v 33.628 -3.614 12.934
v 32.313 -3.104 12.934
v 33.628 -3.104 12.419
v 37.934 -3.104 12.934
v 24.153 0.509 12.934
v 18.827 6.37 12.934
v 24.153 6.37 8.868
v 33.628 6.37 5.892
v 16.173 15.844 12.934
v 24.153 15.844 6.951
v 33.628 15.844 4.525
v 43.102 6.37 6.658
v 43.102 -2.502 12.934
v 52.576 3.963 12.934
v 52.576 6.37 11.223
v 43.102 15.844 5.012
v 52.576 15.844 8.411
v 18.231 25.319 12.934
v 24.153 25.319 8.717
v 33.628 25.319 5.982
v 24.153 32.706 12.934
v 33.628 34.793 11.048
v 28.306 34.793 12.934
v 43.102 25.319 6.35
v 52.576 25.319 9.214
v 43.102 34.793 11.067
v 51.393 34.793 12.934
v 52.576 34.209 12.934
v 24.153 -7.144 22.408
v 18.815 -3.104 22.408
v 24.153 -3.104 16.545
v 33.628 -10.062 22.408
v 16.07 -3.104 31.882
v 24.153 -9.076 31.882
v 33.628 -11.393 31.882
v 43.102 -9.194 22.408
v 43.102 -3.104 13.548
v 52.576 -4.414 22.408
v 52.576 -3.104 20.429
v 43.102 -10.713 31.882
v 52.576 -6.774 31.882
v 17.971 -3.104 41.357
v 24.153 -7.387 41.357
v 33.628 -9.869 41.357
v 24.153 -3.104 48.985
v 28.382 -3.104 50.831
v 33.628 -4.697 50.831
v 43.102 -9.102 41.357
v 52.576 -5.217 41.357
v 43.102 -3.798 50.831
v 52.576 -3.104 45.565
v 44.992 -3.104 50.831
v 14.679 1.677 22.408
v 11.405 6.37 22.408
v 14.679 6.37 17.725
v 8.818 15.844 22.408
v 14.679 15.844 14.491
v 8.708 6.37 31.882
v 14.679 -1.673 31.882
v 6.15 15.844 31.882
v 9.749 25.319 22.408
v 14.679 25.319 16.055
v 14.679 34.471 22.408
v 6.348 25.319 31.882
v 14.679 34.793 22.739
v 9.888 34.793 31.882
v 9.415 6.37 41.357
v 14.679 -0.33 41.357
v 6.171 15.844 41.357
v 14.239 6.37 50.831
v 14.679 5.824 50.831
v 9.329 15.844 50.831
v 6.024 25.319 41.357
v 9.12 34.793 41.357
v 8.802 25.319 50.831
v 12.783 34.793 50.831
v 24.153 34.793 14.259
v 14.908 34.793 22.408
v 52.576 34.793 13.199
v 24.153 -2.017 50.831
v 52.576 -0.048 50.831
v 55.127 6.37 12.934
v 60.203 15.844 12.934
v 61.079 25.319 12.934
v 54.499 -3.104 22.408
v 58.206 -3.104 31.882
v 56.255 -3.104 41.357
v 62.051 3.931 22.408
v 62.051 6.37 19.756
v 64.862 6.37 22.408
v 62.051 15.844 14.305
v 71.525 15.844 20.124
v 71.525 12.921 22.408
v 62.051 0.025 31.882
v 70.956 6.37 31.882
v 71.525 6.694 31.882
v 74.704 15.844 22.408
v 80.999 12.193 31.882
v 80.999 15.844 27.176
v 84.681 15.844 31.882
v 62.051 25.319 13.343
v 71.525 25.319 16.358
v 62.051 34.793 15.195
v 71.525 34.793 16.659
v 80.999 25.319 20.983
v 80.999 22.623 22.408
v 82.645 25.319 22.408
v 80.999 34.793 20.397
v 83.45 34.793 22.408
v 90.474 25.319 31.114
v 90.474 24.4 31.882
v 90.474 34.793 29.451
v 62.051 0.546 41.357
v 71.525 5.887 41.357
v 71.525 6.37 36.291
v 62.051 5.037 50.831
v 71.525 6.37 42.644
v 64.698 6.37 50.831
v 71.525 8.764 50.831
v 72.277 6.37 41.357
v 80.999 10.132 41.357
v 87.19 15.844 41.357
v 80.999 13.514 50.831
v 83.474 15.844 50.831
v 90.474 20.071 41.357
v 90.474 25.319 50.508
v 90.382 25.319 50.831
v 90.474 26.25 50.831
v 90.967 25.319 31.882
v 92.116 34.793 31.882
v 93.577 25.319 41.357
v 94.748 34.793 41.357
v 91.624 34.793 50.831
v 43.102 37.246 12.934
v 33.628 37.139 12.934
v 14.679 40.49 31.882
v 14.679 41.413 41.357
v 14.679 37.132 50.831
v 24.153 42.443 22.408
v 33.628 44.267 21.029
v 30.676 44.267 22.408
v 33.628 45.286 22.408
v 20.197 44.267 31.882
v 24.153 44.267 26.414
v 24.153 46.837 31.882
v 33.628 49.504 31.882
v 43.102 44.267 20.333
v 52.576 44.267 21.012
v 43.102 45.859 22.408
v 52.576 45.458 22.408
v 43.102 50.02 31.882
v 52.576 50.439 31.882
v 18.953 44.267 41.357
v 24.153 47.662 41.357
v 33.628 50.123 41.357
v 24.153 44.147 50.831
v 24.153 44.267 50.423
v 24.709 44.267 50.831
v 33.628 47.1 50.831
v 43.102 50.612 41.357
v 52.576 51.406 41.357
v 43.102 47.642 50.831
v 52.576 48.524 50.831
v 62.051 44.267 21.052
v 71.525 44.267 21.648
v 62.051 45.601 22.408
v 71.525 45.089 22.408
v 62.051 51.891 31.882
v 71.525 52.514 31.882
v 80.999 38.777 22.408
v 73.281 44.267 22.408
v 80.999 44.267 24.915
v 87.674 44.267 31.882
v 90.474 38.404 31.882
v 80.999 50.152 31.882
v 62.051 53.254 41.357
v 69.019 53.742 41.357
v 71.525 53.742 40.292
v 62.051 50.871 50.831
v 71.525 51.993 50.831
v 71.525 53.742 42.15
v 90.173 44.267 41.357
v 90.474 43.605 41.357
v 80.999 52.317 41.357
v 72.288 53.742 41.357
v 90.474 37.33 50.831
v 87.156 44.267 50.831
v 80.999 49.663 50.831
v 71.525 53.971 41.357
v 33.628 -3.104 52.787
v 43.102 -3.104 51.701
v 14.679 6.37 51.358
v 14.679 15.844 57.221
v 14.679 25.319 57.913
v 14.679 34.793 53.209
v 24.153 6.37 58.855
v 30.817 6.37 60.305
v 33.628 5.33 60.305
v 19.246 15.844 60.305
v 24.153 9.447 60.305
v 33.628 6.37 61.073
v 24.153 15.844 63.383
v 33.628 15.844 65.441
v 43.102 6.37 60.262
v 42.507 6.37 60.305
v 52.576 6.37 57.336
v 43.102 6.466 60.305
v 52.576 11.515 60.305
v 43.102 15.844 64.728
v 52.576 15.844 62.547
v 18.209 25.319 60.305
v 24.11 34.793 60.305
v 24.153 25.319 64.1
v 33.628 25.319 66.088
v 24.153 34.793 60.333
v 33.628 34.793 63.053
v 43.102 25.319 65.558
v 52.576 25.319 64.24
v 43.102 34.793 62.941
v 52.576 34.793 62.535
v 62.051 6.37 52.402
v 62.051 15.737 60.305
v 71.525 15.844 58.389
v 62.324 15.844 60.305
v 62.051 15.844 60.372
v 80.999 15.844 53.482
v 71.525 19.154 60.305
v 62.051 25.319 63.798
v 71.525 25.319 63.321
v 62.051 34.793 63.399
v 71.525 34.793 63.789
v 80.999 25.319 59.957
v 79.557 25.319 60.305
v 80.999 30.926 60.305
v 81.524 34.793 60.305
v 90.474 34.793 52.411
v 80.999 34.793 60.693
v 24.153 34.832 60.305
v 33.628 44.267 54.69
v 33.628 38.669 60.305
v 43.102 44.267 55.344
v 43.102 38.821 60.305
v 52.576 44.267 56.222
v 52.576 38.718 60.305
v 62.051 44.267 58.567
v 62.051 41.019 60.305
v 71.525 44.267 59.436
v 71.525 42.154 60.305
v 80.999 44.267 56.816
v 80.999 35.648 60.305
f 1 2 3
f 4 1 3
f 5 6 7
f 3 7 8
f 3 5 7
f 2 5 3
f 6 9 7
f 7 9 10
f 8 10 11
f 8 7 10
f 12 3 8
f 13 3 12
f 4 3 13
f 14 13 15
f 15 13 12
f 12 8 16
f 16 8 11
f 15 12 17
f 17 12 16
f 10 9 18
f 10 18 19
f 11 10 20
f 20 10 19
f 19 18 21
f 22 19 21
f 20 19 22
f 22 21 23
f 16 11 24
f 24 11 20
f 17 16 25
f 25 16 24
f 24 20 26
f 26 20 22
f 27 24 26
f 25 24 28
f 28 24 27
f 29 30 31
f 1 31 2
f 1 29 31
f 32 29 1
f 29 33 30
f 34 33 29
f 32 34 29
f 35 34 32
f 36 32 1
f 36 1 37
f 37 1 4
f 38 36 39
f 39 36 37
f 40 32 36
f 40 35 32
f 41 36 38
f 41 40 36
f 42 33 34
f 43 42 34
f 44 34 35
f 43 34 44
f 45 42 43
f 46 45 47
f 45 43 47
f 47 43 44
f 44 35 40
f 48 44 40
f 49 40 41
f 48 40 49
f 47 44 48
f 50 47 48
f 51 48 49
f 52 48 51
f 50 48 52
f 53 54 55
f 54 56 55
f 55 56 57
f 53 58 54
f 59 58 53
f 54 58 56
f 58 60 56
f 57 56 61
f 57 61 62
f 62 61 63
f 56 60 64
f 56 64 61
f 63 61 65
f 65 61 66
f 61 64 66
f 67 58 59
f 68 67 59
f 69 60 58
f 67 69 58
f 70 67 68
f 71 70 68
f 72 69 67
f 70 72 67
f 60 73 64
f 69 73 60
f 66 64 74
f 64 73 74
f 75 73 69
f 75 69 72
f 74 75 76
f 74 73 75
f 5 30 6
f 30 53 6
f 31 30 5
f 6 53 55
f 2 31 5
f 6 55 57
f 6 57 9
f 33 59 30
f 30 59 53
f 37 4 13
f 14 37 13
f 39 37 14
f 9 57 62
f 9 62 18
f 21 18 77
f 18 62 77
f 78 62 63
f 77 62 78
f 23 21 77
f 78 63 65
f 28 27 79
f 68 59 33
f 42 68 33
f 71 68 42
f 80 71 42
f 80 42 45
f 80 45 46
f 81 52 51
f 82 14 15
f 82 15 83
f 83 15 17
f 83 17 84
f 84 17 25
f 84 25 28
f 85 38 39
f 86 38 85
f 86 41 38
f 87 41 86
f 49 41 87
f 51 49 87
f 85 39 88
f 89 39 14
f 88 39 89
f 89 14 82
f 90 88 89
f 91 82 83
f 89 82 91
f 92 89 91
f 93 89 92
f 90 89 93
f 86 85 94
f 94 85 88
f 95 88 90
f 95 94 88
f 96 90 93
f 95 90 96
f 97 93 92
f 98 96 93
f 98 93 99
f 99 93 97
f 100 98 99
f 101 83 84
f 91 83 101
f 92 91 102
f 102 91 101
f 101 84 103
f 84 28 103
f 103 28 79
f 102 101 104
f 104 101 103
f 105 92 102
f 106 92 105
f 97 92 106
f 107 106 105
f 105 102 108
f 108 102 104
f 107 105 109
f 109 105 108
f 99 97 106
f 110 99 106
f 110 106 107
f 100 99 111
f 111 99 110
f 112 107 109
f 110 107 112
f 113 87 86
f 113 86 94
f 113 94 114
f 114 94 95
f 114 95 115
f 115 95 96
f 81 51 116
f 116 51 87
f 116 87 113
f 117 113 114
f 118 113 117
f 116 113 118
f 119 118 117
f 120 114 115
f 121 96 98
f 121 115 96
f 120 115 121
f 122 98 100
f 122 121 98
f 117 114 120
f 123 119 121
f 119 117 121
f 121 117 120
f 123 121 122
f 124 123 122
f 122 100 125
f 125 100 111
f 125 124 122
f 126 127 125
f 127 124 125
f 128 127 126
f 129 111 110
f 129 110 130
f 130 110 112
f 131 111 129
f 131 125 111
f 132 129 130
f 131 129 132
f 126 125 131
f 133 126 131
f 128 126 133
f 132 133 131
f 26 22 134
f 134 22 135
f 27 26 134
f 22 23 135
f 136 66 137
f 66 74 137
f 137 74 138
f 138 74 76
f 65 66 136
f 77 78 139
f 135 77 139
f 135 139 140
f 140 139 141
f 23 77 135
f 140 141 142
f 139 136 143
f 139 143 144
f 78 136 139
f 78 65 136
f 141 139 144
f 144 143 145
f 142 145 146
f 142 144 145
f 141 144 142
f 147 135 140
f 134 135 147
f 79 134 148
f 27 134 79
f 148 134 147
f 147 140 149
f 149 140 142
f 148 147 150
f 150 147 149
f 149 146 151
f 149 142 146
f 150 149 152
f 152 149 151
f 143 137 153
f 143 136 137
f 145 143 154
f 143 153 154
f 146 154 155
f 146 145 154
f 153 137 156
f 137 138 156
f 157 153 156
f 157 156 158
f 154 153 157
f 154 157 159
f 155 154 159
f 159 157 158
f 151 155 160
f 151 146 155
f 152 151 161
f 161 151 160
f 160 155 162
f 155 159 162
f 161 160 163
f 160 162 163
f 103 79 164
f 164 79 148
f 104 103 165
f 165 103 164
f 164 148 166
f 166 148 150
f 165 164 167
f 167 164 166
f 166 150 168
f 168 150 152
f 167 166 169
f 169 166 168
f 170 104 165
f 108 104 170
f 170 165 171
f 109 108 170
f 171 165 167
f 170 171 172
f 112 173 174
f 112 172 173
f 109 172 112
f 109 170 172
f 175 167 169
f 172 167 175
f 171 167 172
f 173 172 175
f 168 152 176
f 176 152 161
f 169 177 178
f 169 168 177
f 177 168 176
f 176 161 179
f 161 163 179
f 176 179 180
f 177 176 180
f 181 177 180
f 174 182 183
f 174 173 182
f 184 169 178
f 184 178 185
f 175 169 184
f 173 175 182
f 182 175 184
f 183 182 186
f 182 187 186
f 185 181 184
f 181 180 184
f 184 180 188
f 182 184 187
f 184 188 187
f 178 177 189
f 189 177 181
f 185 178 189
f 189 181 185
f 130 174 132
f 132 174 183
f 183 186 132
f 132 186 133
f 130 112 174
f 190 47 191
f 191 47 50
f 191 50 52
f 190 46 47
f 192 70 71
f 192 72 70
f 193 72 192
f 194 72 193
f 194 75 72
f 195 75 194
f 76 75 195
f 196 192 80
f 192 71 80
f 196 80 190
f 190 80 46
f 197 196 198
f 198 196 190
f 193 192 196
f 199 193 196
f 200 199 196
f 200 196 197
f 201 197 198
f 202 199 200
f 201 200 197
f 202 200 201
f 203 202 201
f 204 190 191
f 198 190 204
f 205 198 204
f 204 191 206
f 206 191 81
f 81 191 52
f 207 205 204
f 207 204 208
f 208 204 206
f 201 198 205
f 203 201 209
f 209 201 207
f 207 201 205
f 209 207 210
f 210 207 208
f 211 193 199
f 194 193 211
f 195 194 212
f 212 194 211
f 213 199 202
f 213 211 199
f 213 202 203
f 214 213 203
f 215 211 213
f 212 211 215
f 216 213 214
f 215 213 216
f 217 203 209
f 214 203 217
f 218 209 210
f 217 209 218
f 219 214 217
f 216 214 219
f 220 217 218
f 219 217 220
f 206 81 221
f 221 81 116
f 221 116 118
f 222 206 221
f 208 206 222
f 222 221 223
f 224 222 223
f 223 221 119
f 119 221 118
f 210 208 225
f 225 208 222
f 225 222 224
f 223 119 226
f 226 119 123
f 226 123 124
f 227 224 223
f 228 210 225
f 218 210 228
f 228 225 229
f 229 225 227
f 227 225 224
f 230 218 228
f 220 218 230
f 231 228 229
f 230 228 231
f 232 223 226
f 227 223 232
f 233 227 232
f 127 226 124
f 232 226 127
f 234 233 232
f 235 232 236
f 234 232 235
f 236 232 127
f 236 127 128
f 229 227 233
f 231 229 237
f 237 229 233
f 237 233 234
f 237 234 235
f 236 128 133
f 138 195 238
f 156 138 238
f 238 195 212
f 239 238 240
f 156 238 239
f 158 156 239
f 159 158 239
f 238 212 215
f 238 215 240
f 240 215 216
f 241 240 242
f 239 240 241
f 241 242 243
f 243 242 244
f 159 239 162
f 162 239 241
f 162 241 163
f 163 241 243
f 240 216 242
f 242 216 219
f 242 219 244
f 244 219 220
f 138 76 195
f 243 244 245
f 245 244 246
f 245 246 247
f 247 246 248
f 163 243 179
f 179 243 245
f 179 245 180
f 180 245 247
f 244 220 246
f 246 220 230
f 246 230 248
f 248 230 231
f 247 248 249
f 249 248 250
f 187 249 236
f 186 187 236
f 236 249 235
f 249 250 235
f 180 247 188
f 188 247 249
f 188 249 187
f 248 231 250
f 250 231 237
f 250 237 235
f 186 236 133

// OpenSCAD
/*
SomeBalls.scad
Public Domain Code
Based on Metaballs By: William A Adams 	4 June 2011

This code is a simplified implementation of the 'metaball' and uses "Marching Cubes" to register the isosurface which is the interaction of the various balls. All Cubes are tested and a joint hull is generated of each corner that lies inside the threshold  of the metaball 



*/
Resolution = 10;//[5:5:50]
MinSubdivisions=4;//[2:1:10] 
// Smaller number larger blob
Threshold = 1.89;// [1.5:0.01:2.5]
Threshold2 = 1.95;// [1.5:0.01:2.5]

Diagnostic=false;
Oversize=0.2;
// List Format [[x,y,z,r],[x,y,z,r]]
//MyBallList=[[50, 50, 50, -11],[25, 5, 5, 35],[95, 5, 75, 45],[-35, 5, 75, 55]];//Threshold = 1.95
MyBallList=[ for(i=[0:2])Lotto(i)];


DrawMetaballs(MyBallList,Threshold);
//color(rndc())for(i=[0:8]){translate([rands(0, 125, 1)[0],rands(15, 30, 1)[0],rands(15, 35, 1)[0]])rotate([0,90,0])sphere(20,$fn=12);}


module DrawMetaballs(BallList,Threshold) {
 ColorList = [ for(i=[0:len(BallList)])rndc() ];
 
// boundary plus some extra
size=max(findMax(BallList, 0),findMax(BallList, 1),findMax(BallList,2));
DrawSubMetaballs(BallList,ColorList,Threshold,findMin(BallList, 0)-(size*Oversize),findMin(BallList, 1)-(size*Oversize),findMin(BallList, 2)-(size*Oversize),size*(Oversize*2+1)); 
    


 }
module DrawSubMetaballs(BallList,ColorList,Threshold,x,y,z,Size,i=0) {    
  //  echo(i,Size);

suma = BallField3D(x, y, z, BallList, len(BallList) - 1);
sumb = BallField3D(x + Size, y, z, BallList, len(BallList) - 1);
sumc = BallField3D(x, y + Size, z, BallList, len(BallList) - 1);
sumd = BallField3D(x + Size, y + Size, z, BallList, len(BallList) - 1);
sume = BallField3D(x, y, z + Size, BallList, len(BallList) - 1);
sumf = BallField3D(x + Size, y, z + Size, BallList, len(BallList) - 1);
sumg = BallField3D(x, y + Size, z + Size, BallList, len(BallList) - 1);
sumh = BallField3D(x + Size, y + Size, z + Size, BallList, len(BallList) - 1);
sumcolor =lim31(1, ColorField3D(x, y, z, BallList,ColorList, len(BallList) - 1));


    
sab=inter(suma,sumb)*Size;
sac=inter(suma,sumc)*Size;
sae=inter(suma,sume)*Size;
sba=inter(sumb,suma)*Size;
sbd=inter(sumb,sumd)*Size;
sbf=inter(sumb,sumf)*Size;
sca=inter(sumc,suma)*Size;
scd=inter(sumc,sumd)*Size;
scg=inter(sumc,sumg)*Size;
sdb=inter(sumd,sumb)*Size;
sdc=inter(sumd,sumc)*Size;
sdh=inter(sumd,sumh)*Size;
sea=inter(sume,suma)*Size;
seg=inter(sume,sumg)*Size;
sef=inter(sume,sumf)*Size;
sfh=inter(sumf,sumh)*Size;
sfe=inter(sumf,sume)*Size;
sfb=inter(sumf,sumb)*Size;
sge=inter(sumg,sume)*Size;
sgh=inter(sumg,sumh)*Size;
sgc=inter(sumg,sumc)*Size;
shg=inter(sumh,sumg)*Size;
shf=inter(sumh,sumf)*Size;
shd=inter(sumh,sumd)*Size;

// test for empty and full Cubes
 if (Size>pow(Resolution, MinSubdivisions)||i<MinSubdivisions) { 
    h=Size*0.5  ;
    DrawSubMetaballs(BallList,ColorList,Threshold,x,y,z,h,i+1);
    DrawSubMetaballs(BallList,ColorList,Threshold,x+h,y,z,h,i+1);
    DrawSubMetaballs(BallList,ColorList,Threshold,x,y+h,z,h,i+1);
    DrawSubMetaballs(BallList,ColorList,Threshold,x+h,y+h,z,h,i+1);
    
    DrawSubMetaballs(BallList,ColorList,Threshold,x,y,z+h,h,i+1);
    DrawSubMetaballs(BallList,ColorList,Threshold,x+h,y,z+h,h,i+1);
    DrawSubMetaballs(BallList,ColorList,Threshold,x,y+h,z+h,h,i+1);
    DrawSubMetaballs(BallList,ColorList,Threshold,x+h,y+h,z+h,h,i+1);
    
    }else {
    
if (  suma <= Threshold && sumb <= Threshold && sumc <= Threshold && sumd <= Threshold && sume <= Threshold && sumf <= Threshold && sumg <= Threshold && sumh <= Threshold) {if (Diagnostic){translate([x, y, z]) %cube(Size);}} 
else if ( suma > Threshold && sumb > Threshold && sumc > Threshold && sumd > Threshold && sume > Threshold && sumf > Threshold && sumg > Threshold && sumh > Threshold) {
translate([x, y, z])  color(sumcolor) cube(Size);} 


else if(Size>Resolution){ 
    h=Size*0.5  ;
    DrawSubMetaballs(BallList,ColorList,Threshold,x,y,z,h,i+1);
    DrawSubMetaballs(BallList,ColorList,Threshold,x+h,y,z,h,i+1);
    DrawSubMetaballs(BallList,ColorList,Threshold,x,y+h,z,h,i+1);
    DrawSubMetaballs(BallList,ColorList,Threshold,x+h,y+h,z,h,i+1);
    
    DrawSubMetaballs(BallList,ColorList,Threshold,x,y,z+h,h,i+1);
    DrawSubMetaballs(BallList,ColorList,Threshold,x+h,y,z+h,h,i+1);
    DrawSubMetaballs(BallList,ColorList,Threshold,x,y+h,z+h,h,i+1);
    DrawSubMetaballs(BallList,ColorList,Threshold,x+h,y+h,z+h,h,i+1);}
else { 

    // For every corner inside treshold make and mirror a corner piece, hull the lot.
   //echo(sumcolor);
    color(sumcolor)hull(){
if (suma > Threshold){    translate([x, y, z])  Corner(sab,sac,sae);}
if (sumb > Threshold){    translate([x + Size, y, z])  Corner(-sba,sbd,sbf);}
if (sumc > Threshold){  translate([x, y + Size, z])  Corner(scd,-sca,scg);}
if (sumd > Threshold){    translate([x + Size, y + Size, z]) Corner(-sdc,-sdb,sdh);}
    
if (sume > Threshold){   translate([x, y, z + Size])  Corner(sef,seg,-sea);}
if (sumf > Threshold){   translate([x + Size, y, z + Size])  Corner(-sfe,sfh,-sfb);}
if (sumg > Threshold){    translate([x, y + Size, z + Size])  Corner(sgh,-sge,-sgc);}
if (sumh > Threshold){    translate([x + Size, y + Size, z + Size]) Corner(-shg,-shf,-shd);}
}
    }
}}




//Corner piece
module Corner(u=0.5,v=0.5,w=0.5) {scale([u,v,w])
polyhedron
    (points = [	       [0,0,0],[1,0,0],[0,1,0],[0,0,1],],      faces = [		  [0,0,1],[0,0,2],[0,0,3],[1,2,3]
		  ]
     );}
     
     function lim31(l, v) = v / len3(v) * l;
     function len3(v) = sqrt(pow(v[0], 2) + pow(v[1], 2) + pow(v[2], 2));
// Random color

function Lotto(i) = [rands(i*30,i*30+ 30, 1)[0],rands(0, 65, 1)[0],rands(0, 75, 1)[0],rands(21, 24, 1)[0]];

//Field function
     function ColorField3D(x, y, z, BallSack,Colorsack, i) = (i == 0) ? Powercolor(x, y, z, BallSack[0])*Colorsack[0]: Powercolor(x, y, z, BallSack[i])*Colorsack[i] + ColorField3D(x, y, z, BallSack,Colorsack, i - 1);

function Powercolor(x, y, z, Ball) = (Ball[3] / sqrt((x - Ball[0]) * (x - Ball[0]) + (y - Ball[1]) * (y - Ball[1]) + (z - Ball[2]) * (z - Ball[2])));     
function Powerball(x, y, z, Ball) = (Ball[3] / sqrt((x - Ball[0]) * (x - Ball[0]) + (y - Ball[1]) * (y - Ball[1]) + (z - Ball[2]) * (z - Ball[2])));
// Recursive Field Evaluation
function BallField3D(x, y, z, BallSack, i) = (i == 0) ? Powerball(x, y, z, BallSack[0]): Powerball(x, y, z, BallSack[i]) + BallField3D(x, y, z, BallSack, i - 1);
function rndc() = [round(rands(0, 2, 1)[0])/2, round(rands(0, 2, 1)[0])/2, round(rands(0, 2, 1)[0])/2];
     //interpolate
function inter(t,r)=(t==r)?1:(t>Threshold)?(r<Threshold)? abs(Threshold-t)/abs(t-r) :0 :(r>Threshold)? abs(Threshold-t)/abs(t-r) :1 ;
// Recursive find min/max extremes
function findMax(v, select, i = 0) = ((i + 1) < len(v)) ? max(v[i][select] + abs(v[i][3]) + Resolution, findMax(v, select, i + 1)): v[i][select] + abs(v[i][3]) + Resolution;
function findMin(v, select, i = 0) = ((i + 1) < len(v)) ? min(v[i][select] - abs(v[i][3]) - Resolution, findMin(v, select, i + 1)): v[i][select] - abs(v[i][3]) - Resolution;
